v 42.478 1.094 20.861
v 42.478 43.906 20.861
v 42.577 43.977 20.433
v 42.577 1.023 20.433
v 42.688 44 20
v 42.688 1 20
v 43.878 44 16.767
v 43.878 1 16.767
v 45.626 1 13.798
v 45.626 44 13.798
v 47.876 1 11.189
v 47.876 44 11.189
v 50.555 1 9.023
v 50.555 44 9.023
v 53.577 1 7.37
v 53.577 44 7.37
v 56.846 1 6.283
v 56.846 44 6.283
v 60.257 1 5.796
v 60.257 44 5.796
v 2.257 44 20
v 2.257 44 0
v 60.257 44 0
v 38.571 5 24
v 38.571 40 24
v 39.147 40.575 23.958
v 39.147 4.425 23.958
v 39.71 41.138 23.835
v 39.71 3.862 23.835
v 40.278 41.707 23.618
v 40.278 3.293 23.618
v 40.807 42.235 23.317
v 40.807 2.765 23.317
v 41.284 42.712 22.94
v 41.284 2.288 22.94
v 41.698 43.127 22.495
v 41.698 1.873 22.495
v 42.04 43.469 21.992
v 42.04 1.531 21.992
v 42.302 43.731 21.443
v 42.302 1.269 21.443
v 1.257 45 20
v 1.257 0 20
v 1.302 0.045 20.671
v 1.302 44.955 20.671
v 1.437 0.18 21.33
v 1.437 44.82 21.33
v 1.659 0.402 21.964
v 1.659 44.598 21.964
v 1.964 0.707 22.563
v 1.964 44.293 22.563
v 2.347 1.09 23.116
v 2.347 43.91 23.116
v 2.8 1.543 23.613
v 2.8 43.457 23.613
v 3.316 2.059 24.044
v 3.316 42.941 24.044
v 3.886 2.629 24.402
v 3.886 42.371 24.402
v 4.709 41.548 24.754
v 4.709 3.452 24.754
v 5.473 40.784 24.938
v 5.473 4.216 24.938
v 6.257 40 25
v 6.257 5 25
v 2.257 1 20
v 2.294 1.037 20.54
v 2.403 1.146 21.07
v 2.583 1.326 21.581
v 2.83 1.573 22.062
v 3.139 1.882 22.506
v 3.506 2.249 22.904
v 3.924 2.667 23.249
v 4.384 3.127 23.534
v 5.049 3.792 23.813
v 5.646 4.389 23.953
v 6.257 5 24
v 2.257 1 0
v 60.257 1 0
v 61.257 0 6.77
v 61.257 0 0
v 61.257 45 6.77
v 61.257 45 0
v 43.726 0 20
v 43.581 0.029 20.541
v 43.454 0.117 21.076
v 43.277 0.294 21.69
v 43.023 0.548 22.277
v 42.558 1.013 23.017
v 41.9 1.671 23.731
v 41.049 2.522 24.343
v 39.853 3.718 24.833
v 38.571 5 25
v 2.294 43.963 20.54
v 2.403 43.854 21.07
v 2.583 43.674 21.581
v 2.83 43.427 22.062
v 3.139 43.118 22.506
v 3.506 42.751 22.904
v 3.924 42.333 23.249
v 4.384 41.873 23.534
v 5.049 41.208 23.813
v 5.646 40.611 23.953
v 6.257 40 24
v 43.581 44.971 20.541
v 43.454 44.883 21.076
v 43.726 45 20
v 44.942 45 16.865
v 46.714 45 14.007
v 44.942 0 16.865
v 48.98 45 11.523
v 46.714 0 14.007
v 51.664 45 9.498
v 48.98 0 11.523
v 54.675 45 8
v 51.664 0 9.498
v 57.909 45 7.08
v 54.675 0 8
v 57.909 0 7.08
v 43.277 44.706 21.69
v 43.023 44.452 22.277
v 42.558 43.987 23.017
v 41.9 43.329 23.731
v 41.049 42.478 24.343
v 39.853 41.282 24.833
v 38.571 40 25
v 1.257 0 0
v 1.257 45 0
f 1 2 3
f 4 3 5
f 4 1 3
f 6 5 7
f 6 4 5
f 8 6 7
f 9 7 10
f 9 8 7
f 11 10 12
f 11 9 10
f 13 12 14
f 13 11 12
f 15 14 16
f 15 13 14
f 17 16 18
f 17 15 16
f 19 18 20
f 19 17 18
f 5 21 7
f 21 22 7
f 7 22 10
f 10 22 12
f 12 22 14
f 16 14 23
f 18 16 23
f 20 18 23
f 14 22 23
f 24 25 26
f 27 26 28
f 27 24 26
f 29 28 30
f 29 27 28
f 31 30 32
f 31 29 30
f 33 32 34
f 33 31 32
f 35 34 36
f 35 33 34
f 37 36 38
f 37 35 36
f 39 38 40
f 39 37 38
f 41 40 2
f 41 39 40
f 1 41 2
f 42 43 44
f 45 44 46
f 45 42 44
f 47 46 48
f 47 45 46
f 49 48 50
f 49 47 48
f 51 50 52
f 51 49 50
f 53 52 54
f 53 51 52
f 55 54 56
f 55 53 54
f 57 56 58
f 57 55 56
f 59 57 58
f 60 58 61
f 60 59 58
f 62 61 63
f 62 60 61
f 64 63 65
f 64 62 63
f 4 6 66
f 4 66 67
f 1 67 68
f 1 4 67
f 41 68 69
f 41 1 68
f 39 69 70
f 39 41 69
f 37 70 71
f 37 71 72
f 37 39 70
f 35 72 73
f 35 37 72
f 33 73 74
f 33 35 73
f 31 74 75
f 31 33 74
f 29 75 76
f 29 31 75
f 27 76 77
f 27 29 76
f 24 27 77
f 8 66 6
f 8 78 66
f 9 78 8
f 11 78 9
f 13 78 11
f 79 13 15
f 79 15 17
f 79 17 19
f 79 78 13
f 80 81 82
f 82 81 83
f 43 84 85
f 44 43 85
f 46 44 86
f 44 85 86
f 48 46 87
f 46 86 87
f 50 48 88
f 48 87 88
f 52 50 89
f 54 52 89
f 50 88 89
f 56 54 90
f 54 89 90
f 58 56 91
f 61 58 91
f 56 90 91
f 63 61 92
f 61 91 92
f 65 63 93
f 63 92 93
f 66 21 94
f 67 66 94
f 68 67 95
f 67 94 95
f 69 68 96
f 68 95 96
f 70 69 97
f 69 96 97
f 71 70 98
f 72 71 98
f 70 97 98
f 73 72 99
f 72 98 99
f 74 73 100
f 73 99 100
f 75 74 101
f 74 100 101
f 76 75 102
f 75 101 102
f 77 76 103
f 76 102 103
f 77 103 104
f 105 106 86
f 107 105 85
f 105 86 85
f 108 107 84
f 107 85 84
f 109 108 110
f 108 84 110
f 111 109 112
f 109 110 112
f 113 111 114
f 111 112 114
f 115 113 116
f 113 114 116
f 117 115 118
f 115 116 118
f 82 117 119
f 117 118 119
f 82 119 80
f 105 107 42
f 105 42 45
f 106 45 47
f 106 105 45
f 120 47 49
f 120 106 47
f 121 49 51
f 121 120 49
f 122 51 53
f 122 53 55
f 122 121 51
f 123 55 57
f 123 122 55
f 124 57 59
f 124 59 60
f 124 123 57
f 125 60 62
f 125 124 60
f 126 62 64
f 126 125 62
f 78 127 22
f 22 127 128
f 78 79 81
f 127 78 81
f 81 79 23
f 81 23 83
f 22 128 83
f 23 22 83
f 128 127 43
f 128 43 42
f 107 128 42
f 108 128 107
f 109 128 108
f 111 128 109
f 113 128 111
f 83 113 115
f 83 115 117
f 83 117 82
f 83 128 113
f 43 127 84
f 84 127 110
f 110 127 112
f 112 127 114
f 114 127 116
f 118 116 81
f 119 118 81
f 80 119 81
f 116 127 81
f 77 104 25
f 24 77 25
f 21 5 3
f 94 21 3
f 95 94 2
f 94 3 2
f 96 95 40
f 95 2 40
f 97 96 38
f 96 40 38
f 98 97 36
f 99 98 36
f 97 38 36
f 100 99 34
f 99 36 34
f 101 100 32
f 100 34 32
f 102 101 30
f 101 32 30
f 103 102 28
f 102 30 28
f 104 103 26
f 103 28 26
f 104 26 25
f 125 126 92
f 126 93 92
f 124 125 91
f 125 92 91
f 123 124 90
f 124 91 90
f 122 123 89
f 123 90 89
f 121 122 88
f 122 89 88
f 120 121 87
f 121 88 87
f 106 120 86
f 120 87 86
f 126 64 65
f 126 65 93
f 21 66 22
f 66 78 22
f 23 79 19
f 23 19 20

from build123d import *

# Parameters (mm, degrees)
F0_W     = 60
F0_H     = 45
F1_DEPTH = 25
F2_R     = 18.230112
F3_DEPTH = 45.001
F4_R     = 5
F5_T     = -1


with BuildPart() as f1:
    # F0 (on Top) → F1 (new body)
    with BuildSketch(Plane.XY):
        with Locations((31.256983, 22.5)):
            Rectangle(F0_W, F0_H)
    extrude(amount=F1_DEPTH)

    # F2 (on face) → F3 (cut, through all)
    with BuildSketch(Plane.XZ):
        with Locations((61.256983, 25)):
            Circle(F2_R)
    extrude(amount=-F3_DEPTH, mode=Mode.SUBTRACT)

    # F4
    f4_edges = [f1.edges().sort_by_distance(p)[0] for p in [
        (43.026871, 22.5, 25),
        (22.141927, 0, 25),
        (1.256983, 22.5, 25),
        (22.141927, 45, 25),
    ]]
    fillet(f4_edges, radius=F4_R)

    # F5
    f5_openings = [f1.faces().sort_by_distance(p)[0] for p in [
        (31.256983, 22.5, 0),
    ]]
    offset(amount=F5_T, openings=f5_openings)


solid = f1.part
